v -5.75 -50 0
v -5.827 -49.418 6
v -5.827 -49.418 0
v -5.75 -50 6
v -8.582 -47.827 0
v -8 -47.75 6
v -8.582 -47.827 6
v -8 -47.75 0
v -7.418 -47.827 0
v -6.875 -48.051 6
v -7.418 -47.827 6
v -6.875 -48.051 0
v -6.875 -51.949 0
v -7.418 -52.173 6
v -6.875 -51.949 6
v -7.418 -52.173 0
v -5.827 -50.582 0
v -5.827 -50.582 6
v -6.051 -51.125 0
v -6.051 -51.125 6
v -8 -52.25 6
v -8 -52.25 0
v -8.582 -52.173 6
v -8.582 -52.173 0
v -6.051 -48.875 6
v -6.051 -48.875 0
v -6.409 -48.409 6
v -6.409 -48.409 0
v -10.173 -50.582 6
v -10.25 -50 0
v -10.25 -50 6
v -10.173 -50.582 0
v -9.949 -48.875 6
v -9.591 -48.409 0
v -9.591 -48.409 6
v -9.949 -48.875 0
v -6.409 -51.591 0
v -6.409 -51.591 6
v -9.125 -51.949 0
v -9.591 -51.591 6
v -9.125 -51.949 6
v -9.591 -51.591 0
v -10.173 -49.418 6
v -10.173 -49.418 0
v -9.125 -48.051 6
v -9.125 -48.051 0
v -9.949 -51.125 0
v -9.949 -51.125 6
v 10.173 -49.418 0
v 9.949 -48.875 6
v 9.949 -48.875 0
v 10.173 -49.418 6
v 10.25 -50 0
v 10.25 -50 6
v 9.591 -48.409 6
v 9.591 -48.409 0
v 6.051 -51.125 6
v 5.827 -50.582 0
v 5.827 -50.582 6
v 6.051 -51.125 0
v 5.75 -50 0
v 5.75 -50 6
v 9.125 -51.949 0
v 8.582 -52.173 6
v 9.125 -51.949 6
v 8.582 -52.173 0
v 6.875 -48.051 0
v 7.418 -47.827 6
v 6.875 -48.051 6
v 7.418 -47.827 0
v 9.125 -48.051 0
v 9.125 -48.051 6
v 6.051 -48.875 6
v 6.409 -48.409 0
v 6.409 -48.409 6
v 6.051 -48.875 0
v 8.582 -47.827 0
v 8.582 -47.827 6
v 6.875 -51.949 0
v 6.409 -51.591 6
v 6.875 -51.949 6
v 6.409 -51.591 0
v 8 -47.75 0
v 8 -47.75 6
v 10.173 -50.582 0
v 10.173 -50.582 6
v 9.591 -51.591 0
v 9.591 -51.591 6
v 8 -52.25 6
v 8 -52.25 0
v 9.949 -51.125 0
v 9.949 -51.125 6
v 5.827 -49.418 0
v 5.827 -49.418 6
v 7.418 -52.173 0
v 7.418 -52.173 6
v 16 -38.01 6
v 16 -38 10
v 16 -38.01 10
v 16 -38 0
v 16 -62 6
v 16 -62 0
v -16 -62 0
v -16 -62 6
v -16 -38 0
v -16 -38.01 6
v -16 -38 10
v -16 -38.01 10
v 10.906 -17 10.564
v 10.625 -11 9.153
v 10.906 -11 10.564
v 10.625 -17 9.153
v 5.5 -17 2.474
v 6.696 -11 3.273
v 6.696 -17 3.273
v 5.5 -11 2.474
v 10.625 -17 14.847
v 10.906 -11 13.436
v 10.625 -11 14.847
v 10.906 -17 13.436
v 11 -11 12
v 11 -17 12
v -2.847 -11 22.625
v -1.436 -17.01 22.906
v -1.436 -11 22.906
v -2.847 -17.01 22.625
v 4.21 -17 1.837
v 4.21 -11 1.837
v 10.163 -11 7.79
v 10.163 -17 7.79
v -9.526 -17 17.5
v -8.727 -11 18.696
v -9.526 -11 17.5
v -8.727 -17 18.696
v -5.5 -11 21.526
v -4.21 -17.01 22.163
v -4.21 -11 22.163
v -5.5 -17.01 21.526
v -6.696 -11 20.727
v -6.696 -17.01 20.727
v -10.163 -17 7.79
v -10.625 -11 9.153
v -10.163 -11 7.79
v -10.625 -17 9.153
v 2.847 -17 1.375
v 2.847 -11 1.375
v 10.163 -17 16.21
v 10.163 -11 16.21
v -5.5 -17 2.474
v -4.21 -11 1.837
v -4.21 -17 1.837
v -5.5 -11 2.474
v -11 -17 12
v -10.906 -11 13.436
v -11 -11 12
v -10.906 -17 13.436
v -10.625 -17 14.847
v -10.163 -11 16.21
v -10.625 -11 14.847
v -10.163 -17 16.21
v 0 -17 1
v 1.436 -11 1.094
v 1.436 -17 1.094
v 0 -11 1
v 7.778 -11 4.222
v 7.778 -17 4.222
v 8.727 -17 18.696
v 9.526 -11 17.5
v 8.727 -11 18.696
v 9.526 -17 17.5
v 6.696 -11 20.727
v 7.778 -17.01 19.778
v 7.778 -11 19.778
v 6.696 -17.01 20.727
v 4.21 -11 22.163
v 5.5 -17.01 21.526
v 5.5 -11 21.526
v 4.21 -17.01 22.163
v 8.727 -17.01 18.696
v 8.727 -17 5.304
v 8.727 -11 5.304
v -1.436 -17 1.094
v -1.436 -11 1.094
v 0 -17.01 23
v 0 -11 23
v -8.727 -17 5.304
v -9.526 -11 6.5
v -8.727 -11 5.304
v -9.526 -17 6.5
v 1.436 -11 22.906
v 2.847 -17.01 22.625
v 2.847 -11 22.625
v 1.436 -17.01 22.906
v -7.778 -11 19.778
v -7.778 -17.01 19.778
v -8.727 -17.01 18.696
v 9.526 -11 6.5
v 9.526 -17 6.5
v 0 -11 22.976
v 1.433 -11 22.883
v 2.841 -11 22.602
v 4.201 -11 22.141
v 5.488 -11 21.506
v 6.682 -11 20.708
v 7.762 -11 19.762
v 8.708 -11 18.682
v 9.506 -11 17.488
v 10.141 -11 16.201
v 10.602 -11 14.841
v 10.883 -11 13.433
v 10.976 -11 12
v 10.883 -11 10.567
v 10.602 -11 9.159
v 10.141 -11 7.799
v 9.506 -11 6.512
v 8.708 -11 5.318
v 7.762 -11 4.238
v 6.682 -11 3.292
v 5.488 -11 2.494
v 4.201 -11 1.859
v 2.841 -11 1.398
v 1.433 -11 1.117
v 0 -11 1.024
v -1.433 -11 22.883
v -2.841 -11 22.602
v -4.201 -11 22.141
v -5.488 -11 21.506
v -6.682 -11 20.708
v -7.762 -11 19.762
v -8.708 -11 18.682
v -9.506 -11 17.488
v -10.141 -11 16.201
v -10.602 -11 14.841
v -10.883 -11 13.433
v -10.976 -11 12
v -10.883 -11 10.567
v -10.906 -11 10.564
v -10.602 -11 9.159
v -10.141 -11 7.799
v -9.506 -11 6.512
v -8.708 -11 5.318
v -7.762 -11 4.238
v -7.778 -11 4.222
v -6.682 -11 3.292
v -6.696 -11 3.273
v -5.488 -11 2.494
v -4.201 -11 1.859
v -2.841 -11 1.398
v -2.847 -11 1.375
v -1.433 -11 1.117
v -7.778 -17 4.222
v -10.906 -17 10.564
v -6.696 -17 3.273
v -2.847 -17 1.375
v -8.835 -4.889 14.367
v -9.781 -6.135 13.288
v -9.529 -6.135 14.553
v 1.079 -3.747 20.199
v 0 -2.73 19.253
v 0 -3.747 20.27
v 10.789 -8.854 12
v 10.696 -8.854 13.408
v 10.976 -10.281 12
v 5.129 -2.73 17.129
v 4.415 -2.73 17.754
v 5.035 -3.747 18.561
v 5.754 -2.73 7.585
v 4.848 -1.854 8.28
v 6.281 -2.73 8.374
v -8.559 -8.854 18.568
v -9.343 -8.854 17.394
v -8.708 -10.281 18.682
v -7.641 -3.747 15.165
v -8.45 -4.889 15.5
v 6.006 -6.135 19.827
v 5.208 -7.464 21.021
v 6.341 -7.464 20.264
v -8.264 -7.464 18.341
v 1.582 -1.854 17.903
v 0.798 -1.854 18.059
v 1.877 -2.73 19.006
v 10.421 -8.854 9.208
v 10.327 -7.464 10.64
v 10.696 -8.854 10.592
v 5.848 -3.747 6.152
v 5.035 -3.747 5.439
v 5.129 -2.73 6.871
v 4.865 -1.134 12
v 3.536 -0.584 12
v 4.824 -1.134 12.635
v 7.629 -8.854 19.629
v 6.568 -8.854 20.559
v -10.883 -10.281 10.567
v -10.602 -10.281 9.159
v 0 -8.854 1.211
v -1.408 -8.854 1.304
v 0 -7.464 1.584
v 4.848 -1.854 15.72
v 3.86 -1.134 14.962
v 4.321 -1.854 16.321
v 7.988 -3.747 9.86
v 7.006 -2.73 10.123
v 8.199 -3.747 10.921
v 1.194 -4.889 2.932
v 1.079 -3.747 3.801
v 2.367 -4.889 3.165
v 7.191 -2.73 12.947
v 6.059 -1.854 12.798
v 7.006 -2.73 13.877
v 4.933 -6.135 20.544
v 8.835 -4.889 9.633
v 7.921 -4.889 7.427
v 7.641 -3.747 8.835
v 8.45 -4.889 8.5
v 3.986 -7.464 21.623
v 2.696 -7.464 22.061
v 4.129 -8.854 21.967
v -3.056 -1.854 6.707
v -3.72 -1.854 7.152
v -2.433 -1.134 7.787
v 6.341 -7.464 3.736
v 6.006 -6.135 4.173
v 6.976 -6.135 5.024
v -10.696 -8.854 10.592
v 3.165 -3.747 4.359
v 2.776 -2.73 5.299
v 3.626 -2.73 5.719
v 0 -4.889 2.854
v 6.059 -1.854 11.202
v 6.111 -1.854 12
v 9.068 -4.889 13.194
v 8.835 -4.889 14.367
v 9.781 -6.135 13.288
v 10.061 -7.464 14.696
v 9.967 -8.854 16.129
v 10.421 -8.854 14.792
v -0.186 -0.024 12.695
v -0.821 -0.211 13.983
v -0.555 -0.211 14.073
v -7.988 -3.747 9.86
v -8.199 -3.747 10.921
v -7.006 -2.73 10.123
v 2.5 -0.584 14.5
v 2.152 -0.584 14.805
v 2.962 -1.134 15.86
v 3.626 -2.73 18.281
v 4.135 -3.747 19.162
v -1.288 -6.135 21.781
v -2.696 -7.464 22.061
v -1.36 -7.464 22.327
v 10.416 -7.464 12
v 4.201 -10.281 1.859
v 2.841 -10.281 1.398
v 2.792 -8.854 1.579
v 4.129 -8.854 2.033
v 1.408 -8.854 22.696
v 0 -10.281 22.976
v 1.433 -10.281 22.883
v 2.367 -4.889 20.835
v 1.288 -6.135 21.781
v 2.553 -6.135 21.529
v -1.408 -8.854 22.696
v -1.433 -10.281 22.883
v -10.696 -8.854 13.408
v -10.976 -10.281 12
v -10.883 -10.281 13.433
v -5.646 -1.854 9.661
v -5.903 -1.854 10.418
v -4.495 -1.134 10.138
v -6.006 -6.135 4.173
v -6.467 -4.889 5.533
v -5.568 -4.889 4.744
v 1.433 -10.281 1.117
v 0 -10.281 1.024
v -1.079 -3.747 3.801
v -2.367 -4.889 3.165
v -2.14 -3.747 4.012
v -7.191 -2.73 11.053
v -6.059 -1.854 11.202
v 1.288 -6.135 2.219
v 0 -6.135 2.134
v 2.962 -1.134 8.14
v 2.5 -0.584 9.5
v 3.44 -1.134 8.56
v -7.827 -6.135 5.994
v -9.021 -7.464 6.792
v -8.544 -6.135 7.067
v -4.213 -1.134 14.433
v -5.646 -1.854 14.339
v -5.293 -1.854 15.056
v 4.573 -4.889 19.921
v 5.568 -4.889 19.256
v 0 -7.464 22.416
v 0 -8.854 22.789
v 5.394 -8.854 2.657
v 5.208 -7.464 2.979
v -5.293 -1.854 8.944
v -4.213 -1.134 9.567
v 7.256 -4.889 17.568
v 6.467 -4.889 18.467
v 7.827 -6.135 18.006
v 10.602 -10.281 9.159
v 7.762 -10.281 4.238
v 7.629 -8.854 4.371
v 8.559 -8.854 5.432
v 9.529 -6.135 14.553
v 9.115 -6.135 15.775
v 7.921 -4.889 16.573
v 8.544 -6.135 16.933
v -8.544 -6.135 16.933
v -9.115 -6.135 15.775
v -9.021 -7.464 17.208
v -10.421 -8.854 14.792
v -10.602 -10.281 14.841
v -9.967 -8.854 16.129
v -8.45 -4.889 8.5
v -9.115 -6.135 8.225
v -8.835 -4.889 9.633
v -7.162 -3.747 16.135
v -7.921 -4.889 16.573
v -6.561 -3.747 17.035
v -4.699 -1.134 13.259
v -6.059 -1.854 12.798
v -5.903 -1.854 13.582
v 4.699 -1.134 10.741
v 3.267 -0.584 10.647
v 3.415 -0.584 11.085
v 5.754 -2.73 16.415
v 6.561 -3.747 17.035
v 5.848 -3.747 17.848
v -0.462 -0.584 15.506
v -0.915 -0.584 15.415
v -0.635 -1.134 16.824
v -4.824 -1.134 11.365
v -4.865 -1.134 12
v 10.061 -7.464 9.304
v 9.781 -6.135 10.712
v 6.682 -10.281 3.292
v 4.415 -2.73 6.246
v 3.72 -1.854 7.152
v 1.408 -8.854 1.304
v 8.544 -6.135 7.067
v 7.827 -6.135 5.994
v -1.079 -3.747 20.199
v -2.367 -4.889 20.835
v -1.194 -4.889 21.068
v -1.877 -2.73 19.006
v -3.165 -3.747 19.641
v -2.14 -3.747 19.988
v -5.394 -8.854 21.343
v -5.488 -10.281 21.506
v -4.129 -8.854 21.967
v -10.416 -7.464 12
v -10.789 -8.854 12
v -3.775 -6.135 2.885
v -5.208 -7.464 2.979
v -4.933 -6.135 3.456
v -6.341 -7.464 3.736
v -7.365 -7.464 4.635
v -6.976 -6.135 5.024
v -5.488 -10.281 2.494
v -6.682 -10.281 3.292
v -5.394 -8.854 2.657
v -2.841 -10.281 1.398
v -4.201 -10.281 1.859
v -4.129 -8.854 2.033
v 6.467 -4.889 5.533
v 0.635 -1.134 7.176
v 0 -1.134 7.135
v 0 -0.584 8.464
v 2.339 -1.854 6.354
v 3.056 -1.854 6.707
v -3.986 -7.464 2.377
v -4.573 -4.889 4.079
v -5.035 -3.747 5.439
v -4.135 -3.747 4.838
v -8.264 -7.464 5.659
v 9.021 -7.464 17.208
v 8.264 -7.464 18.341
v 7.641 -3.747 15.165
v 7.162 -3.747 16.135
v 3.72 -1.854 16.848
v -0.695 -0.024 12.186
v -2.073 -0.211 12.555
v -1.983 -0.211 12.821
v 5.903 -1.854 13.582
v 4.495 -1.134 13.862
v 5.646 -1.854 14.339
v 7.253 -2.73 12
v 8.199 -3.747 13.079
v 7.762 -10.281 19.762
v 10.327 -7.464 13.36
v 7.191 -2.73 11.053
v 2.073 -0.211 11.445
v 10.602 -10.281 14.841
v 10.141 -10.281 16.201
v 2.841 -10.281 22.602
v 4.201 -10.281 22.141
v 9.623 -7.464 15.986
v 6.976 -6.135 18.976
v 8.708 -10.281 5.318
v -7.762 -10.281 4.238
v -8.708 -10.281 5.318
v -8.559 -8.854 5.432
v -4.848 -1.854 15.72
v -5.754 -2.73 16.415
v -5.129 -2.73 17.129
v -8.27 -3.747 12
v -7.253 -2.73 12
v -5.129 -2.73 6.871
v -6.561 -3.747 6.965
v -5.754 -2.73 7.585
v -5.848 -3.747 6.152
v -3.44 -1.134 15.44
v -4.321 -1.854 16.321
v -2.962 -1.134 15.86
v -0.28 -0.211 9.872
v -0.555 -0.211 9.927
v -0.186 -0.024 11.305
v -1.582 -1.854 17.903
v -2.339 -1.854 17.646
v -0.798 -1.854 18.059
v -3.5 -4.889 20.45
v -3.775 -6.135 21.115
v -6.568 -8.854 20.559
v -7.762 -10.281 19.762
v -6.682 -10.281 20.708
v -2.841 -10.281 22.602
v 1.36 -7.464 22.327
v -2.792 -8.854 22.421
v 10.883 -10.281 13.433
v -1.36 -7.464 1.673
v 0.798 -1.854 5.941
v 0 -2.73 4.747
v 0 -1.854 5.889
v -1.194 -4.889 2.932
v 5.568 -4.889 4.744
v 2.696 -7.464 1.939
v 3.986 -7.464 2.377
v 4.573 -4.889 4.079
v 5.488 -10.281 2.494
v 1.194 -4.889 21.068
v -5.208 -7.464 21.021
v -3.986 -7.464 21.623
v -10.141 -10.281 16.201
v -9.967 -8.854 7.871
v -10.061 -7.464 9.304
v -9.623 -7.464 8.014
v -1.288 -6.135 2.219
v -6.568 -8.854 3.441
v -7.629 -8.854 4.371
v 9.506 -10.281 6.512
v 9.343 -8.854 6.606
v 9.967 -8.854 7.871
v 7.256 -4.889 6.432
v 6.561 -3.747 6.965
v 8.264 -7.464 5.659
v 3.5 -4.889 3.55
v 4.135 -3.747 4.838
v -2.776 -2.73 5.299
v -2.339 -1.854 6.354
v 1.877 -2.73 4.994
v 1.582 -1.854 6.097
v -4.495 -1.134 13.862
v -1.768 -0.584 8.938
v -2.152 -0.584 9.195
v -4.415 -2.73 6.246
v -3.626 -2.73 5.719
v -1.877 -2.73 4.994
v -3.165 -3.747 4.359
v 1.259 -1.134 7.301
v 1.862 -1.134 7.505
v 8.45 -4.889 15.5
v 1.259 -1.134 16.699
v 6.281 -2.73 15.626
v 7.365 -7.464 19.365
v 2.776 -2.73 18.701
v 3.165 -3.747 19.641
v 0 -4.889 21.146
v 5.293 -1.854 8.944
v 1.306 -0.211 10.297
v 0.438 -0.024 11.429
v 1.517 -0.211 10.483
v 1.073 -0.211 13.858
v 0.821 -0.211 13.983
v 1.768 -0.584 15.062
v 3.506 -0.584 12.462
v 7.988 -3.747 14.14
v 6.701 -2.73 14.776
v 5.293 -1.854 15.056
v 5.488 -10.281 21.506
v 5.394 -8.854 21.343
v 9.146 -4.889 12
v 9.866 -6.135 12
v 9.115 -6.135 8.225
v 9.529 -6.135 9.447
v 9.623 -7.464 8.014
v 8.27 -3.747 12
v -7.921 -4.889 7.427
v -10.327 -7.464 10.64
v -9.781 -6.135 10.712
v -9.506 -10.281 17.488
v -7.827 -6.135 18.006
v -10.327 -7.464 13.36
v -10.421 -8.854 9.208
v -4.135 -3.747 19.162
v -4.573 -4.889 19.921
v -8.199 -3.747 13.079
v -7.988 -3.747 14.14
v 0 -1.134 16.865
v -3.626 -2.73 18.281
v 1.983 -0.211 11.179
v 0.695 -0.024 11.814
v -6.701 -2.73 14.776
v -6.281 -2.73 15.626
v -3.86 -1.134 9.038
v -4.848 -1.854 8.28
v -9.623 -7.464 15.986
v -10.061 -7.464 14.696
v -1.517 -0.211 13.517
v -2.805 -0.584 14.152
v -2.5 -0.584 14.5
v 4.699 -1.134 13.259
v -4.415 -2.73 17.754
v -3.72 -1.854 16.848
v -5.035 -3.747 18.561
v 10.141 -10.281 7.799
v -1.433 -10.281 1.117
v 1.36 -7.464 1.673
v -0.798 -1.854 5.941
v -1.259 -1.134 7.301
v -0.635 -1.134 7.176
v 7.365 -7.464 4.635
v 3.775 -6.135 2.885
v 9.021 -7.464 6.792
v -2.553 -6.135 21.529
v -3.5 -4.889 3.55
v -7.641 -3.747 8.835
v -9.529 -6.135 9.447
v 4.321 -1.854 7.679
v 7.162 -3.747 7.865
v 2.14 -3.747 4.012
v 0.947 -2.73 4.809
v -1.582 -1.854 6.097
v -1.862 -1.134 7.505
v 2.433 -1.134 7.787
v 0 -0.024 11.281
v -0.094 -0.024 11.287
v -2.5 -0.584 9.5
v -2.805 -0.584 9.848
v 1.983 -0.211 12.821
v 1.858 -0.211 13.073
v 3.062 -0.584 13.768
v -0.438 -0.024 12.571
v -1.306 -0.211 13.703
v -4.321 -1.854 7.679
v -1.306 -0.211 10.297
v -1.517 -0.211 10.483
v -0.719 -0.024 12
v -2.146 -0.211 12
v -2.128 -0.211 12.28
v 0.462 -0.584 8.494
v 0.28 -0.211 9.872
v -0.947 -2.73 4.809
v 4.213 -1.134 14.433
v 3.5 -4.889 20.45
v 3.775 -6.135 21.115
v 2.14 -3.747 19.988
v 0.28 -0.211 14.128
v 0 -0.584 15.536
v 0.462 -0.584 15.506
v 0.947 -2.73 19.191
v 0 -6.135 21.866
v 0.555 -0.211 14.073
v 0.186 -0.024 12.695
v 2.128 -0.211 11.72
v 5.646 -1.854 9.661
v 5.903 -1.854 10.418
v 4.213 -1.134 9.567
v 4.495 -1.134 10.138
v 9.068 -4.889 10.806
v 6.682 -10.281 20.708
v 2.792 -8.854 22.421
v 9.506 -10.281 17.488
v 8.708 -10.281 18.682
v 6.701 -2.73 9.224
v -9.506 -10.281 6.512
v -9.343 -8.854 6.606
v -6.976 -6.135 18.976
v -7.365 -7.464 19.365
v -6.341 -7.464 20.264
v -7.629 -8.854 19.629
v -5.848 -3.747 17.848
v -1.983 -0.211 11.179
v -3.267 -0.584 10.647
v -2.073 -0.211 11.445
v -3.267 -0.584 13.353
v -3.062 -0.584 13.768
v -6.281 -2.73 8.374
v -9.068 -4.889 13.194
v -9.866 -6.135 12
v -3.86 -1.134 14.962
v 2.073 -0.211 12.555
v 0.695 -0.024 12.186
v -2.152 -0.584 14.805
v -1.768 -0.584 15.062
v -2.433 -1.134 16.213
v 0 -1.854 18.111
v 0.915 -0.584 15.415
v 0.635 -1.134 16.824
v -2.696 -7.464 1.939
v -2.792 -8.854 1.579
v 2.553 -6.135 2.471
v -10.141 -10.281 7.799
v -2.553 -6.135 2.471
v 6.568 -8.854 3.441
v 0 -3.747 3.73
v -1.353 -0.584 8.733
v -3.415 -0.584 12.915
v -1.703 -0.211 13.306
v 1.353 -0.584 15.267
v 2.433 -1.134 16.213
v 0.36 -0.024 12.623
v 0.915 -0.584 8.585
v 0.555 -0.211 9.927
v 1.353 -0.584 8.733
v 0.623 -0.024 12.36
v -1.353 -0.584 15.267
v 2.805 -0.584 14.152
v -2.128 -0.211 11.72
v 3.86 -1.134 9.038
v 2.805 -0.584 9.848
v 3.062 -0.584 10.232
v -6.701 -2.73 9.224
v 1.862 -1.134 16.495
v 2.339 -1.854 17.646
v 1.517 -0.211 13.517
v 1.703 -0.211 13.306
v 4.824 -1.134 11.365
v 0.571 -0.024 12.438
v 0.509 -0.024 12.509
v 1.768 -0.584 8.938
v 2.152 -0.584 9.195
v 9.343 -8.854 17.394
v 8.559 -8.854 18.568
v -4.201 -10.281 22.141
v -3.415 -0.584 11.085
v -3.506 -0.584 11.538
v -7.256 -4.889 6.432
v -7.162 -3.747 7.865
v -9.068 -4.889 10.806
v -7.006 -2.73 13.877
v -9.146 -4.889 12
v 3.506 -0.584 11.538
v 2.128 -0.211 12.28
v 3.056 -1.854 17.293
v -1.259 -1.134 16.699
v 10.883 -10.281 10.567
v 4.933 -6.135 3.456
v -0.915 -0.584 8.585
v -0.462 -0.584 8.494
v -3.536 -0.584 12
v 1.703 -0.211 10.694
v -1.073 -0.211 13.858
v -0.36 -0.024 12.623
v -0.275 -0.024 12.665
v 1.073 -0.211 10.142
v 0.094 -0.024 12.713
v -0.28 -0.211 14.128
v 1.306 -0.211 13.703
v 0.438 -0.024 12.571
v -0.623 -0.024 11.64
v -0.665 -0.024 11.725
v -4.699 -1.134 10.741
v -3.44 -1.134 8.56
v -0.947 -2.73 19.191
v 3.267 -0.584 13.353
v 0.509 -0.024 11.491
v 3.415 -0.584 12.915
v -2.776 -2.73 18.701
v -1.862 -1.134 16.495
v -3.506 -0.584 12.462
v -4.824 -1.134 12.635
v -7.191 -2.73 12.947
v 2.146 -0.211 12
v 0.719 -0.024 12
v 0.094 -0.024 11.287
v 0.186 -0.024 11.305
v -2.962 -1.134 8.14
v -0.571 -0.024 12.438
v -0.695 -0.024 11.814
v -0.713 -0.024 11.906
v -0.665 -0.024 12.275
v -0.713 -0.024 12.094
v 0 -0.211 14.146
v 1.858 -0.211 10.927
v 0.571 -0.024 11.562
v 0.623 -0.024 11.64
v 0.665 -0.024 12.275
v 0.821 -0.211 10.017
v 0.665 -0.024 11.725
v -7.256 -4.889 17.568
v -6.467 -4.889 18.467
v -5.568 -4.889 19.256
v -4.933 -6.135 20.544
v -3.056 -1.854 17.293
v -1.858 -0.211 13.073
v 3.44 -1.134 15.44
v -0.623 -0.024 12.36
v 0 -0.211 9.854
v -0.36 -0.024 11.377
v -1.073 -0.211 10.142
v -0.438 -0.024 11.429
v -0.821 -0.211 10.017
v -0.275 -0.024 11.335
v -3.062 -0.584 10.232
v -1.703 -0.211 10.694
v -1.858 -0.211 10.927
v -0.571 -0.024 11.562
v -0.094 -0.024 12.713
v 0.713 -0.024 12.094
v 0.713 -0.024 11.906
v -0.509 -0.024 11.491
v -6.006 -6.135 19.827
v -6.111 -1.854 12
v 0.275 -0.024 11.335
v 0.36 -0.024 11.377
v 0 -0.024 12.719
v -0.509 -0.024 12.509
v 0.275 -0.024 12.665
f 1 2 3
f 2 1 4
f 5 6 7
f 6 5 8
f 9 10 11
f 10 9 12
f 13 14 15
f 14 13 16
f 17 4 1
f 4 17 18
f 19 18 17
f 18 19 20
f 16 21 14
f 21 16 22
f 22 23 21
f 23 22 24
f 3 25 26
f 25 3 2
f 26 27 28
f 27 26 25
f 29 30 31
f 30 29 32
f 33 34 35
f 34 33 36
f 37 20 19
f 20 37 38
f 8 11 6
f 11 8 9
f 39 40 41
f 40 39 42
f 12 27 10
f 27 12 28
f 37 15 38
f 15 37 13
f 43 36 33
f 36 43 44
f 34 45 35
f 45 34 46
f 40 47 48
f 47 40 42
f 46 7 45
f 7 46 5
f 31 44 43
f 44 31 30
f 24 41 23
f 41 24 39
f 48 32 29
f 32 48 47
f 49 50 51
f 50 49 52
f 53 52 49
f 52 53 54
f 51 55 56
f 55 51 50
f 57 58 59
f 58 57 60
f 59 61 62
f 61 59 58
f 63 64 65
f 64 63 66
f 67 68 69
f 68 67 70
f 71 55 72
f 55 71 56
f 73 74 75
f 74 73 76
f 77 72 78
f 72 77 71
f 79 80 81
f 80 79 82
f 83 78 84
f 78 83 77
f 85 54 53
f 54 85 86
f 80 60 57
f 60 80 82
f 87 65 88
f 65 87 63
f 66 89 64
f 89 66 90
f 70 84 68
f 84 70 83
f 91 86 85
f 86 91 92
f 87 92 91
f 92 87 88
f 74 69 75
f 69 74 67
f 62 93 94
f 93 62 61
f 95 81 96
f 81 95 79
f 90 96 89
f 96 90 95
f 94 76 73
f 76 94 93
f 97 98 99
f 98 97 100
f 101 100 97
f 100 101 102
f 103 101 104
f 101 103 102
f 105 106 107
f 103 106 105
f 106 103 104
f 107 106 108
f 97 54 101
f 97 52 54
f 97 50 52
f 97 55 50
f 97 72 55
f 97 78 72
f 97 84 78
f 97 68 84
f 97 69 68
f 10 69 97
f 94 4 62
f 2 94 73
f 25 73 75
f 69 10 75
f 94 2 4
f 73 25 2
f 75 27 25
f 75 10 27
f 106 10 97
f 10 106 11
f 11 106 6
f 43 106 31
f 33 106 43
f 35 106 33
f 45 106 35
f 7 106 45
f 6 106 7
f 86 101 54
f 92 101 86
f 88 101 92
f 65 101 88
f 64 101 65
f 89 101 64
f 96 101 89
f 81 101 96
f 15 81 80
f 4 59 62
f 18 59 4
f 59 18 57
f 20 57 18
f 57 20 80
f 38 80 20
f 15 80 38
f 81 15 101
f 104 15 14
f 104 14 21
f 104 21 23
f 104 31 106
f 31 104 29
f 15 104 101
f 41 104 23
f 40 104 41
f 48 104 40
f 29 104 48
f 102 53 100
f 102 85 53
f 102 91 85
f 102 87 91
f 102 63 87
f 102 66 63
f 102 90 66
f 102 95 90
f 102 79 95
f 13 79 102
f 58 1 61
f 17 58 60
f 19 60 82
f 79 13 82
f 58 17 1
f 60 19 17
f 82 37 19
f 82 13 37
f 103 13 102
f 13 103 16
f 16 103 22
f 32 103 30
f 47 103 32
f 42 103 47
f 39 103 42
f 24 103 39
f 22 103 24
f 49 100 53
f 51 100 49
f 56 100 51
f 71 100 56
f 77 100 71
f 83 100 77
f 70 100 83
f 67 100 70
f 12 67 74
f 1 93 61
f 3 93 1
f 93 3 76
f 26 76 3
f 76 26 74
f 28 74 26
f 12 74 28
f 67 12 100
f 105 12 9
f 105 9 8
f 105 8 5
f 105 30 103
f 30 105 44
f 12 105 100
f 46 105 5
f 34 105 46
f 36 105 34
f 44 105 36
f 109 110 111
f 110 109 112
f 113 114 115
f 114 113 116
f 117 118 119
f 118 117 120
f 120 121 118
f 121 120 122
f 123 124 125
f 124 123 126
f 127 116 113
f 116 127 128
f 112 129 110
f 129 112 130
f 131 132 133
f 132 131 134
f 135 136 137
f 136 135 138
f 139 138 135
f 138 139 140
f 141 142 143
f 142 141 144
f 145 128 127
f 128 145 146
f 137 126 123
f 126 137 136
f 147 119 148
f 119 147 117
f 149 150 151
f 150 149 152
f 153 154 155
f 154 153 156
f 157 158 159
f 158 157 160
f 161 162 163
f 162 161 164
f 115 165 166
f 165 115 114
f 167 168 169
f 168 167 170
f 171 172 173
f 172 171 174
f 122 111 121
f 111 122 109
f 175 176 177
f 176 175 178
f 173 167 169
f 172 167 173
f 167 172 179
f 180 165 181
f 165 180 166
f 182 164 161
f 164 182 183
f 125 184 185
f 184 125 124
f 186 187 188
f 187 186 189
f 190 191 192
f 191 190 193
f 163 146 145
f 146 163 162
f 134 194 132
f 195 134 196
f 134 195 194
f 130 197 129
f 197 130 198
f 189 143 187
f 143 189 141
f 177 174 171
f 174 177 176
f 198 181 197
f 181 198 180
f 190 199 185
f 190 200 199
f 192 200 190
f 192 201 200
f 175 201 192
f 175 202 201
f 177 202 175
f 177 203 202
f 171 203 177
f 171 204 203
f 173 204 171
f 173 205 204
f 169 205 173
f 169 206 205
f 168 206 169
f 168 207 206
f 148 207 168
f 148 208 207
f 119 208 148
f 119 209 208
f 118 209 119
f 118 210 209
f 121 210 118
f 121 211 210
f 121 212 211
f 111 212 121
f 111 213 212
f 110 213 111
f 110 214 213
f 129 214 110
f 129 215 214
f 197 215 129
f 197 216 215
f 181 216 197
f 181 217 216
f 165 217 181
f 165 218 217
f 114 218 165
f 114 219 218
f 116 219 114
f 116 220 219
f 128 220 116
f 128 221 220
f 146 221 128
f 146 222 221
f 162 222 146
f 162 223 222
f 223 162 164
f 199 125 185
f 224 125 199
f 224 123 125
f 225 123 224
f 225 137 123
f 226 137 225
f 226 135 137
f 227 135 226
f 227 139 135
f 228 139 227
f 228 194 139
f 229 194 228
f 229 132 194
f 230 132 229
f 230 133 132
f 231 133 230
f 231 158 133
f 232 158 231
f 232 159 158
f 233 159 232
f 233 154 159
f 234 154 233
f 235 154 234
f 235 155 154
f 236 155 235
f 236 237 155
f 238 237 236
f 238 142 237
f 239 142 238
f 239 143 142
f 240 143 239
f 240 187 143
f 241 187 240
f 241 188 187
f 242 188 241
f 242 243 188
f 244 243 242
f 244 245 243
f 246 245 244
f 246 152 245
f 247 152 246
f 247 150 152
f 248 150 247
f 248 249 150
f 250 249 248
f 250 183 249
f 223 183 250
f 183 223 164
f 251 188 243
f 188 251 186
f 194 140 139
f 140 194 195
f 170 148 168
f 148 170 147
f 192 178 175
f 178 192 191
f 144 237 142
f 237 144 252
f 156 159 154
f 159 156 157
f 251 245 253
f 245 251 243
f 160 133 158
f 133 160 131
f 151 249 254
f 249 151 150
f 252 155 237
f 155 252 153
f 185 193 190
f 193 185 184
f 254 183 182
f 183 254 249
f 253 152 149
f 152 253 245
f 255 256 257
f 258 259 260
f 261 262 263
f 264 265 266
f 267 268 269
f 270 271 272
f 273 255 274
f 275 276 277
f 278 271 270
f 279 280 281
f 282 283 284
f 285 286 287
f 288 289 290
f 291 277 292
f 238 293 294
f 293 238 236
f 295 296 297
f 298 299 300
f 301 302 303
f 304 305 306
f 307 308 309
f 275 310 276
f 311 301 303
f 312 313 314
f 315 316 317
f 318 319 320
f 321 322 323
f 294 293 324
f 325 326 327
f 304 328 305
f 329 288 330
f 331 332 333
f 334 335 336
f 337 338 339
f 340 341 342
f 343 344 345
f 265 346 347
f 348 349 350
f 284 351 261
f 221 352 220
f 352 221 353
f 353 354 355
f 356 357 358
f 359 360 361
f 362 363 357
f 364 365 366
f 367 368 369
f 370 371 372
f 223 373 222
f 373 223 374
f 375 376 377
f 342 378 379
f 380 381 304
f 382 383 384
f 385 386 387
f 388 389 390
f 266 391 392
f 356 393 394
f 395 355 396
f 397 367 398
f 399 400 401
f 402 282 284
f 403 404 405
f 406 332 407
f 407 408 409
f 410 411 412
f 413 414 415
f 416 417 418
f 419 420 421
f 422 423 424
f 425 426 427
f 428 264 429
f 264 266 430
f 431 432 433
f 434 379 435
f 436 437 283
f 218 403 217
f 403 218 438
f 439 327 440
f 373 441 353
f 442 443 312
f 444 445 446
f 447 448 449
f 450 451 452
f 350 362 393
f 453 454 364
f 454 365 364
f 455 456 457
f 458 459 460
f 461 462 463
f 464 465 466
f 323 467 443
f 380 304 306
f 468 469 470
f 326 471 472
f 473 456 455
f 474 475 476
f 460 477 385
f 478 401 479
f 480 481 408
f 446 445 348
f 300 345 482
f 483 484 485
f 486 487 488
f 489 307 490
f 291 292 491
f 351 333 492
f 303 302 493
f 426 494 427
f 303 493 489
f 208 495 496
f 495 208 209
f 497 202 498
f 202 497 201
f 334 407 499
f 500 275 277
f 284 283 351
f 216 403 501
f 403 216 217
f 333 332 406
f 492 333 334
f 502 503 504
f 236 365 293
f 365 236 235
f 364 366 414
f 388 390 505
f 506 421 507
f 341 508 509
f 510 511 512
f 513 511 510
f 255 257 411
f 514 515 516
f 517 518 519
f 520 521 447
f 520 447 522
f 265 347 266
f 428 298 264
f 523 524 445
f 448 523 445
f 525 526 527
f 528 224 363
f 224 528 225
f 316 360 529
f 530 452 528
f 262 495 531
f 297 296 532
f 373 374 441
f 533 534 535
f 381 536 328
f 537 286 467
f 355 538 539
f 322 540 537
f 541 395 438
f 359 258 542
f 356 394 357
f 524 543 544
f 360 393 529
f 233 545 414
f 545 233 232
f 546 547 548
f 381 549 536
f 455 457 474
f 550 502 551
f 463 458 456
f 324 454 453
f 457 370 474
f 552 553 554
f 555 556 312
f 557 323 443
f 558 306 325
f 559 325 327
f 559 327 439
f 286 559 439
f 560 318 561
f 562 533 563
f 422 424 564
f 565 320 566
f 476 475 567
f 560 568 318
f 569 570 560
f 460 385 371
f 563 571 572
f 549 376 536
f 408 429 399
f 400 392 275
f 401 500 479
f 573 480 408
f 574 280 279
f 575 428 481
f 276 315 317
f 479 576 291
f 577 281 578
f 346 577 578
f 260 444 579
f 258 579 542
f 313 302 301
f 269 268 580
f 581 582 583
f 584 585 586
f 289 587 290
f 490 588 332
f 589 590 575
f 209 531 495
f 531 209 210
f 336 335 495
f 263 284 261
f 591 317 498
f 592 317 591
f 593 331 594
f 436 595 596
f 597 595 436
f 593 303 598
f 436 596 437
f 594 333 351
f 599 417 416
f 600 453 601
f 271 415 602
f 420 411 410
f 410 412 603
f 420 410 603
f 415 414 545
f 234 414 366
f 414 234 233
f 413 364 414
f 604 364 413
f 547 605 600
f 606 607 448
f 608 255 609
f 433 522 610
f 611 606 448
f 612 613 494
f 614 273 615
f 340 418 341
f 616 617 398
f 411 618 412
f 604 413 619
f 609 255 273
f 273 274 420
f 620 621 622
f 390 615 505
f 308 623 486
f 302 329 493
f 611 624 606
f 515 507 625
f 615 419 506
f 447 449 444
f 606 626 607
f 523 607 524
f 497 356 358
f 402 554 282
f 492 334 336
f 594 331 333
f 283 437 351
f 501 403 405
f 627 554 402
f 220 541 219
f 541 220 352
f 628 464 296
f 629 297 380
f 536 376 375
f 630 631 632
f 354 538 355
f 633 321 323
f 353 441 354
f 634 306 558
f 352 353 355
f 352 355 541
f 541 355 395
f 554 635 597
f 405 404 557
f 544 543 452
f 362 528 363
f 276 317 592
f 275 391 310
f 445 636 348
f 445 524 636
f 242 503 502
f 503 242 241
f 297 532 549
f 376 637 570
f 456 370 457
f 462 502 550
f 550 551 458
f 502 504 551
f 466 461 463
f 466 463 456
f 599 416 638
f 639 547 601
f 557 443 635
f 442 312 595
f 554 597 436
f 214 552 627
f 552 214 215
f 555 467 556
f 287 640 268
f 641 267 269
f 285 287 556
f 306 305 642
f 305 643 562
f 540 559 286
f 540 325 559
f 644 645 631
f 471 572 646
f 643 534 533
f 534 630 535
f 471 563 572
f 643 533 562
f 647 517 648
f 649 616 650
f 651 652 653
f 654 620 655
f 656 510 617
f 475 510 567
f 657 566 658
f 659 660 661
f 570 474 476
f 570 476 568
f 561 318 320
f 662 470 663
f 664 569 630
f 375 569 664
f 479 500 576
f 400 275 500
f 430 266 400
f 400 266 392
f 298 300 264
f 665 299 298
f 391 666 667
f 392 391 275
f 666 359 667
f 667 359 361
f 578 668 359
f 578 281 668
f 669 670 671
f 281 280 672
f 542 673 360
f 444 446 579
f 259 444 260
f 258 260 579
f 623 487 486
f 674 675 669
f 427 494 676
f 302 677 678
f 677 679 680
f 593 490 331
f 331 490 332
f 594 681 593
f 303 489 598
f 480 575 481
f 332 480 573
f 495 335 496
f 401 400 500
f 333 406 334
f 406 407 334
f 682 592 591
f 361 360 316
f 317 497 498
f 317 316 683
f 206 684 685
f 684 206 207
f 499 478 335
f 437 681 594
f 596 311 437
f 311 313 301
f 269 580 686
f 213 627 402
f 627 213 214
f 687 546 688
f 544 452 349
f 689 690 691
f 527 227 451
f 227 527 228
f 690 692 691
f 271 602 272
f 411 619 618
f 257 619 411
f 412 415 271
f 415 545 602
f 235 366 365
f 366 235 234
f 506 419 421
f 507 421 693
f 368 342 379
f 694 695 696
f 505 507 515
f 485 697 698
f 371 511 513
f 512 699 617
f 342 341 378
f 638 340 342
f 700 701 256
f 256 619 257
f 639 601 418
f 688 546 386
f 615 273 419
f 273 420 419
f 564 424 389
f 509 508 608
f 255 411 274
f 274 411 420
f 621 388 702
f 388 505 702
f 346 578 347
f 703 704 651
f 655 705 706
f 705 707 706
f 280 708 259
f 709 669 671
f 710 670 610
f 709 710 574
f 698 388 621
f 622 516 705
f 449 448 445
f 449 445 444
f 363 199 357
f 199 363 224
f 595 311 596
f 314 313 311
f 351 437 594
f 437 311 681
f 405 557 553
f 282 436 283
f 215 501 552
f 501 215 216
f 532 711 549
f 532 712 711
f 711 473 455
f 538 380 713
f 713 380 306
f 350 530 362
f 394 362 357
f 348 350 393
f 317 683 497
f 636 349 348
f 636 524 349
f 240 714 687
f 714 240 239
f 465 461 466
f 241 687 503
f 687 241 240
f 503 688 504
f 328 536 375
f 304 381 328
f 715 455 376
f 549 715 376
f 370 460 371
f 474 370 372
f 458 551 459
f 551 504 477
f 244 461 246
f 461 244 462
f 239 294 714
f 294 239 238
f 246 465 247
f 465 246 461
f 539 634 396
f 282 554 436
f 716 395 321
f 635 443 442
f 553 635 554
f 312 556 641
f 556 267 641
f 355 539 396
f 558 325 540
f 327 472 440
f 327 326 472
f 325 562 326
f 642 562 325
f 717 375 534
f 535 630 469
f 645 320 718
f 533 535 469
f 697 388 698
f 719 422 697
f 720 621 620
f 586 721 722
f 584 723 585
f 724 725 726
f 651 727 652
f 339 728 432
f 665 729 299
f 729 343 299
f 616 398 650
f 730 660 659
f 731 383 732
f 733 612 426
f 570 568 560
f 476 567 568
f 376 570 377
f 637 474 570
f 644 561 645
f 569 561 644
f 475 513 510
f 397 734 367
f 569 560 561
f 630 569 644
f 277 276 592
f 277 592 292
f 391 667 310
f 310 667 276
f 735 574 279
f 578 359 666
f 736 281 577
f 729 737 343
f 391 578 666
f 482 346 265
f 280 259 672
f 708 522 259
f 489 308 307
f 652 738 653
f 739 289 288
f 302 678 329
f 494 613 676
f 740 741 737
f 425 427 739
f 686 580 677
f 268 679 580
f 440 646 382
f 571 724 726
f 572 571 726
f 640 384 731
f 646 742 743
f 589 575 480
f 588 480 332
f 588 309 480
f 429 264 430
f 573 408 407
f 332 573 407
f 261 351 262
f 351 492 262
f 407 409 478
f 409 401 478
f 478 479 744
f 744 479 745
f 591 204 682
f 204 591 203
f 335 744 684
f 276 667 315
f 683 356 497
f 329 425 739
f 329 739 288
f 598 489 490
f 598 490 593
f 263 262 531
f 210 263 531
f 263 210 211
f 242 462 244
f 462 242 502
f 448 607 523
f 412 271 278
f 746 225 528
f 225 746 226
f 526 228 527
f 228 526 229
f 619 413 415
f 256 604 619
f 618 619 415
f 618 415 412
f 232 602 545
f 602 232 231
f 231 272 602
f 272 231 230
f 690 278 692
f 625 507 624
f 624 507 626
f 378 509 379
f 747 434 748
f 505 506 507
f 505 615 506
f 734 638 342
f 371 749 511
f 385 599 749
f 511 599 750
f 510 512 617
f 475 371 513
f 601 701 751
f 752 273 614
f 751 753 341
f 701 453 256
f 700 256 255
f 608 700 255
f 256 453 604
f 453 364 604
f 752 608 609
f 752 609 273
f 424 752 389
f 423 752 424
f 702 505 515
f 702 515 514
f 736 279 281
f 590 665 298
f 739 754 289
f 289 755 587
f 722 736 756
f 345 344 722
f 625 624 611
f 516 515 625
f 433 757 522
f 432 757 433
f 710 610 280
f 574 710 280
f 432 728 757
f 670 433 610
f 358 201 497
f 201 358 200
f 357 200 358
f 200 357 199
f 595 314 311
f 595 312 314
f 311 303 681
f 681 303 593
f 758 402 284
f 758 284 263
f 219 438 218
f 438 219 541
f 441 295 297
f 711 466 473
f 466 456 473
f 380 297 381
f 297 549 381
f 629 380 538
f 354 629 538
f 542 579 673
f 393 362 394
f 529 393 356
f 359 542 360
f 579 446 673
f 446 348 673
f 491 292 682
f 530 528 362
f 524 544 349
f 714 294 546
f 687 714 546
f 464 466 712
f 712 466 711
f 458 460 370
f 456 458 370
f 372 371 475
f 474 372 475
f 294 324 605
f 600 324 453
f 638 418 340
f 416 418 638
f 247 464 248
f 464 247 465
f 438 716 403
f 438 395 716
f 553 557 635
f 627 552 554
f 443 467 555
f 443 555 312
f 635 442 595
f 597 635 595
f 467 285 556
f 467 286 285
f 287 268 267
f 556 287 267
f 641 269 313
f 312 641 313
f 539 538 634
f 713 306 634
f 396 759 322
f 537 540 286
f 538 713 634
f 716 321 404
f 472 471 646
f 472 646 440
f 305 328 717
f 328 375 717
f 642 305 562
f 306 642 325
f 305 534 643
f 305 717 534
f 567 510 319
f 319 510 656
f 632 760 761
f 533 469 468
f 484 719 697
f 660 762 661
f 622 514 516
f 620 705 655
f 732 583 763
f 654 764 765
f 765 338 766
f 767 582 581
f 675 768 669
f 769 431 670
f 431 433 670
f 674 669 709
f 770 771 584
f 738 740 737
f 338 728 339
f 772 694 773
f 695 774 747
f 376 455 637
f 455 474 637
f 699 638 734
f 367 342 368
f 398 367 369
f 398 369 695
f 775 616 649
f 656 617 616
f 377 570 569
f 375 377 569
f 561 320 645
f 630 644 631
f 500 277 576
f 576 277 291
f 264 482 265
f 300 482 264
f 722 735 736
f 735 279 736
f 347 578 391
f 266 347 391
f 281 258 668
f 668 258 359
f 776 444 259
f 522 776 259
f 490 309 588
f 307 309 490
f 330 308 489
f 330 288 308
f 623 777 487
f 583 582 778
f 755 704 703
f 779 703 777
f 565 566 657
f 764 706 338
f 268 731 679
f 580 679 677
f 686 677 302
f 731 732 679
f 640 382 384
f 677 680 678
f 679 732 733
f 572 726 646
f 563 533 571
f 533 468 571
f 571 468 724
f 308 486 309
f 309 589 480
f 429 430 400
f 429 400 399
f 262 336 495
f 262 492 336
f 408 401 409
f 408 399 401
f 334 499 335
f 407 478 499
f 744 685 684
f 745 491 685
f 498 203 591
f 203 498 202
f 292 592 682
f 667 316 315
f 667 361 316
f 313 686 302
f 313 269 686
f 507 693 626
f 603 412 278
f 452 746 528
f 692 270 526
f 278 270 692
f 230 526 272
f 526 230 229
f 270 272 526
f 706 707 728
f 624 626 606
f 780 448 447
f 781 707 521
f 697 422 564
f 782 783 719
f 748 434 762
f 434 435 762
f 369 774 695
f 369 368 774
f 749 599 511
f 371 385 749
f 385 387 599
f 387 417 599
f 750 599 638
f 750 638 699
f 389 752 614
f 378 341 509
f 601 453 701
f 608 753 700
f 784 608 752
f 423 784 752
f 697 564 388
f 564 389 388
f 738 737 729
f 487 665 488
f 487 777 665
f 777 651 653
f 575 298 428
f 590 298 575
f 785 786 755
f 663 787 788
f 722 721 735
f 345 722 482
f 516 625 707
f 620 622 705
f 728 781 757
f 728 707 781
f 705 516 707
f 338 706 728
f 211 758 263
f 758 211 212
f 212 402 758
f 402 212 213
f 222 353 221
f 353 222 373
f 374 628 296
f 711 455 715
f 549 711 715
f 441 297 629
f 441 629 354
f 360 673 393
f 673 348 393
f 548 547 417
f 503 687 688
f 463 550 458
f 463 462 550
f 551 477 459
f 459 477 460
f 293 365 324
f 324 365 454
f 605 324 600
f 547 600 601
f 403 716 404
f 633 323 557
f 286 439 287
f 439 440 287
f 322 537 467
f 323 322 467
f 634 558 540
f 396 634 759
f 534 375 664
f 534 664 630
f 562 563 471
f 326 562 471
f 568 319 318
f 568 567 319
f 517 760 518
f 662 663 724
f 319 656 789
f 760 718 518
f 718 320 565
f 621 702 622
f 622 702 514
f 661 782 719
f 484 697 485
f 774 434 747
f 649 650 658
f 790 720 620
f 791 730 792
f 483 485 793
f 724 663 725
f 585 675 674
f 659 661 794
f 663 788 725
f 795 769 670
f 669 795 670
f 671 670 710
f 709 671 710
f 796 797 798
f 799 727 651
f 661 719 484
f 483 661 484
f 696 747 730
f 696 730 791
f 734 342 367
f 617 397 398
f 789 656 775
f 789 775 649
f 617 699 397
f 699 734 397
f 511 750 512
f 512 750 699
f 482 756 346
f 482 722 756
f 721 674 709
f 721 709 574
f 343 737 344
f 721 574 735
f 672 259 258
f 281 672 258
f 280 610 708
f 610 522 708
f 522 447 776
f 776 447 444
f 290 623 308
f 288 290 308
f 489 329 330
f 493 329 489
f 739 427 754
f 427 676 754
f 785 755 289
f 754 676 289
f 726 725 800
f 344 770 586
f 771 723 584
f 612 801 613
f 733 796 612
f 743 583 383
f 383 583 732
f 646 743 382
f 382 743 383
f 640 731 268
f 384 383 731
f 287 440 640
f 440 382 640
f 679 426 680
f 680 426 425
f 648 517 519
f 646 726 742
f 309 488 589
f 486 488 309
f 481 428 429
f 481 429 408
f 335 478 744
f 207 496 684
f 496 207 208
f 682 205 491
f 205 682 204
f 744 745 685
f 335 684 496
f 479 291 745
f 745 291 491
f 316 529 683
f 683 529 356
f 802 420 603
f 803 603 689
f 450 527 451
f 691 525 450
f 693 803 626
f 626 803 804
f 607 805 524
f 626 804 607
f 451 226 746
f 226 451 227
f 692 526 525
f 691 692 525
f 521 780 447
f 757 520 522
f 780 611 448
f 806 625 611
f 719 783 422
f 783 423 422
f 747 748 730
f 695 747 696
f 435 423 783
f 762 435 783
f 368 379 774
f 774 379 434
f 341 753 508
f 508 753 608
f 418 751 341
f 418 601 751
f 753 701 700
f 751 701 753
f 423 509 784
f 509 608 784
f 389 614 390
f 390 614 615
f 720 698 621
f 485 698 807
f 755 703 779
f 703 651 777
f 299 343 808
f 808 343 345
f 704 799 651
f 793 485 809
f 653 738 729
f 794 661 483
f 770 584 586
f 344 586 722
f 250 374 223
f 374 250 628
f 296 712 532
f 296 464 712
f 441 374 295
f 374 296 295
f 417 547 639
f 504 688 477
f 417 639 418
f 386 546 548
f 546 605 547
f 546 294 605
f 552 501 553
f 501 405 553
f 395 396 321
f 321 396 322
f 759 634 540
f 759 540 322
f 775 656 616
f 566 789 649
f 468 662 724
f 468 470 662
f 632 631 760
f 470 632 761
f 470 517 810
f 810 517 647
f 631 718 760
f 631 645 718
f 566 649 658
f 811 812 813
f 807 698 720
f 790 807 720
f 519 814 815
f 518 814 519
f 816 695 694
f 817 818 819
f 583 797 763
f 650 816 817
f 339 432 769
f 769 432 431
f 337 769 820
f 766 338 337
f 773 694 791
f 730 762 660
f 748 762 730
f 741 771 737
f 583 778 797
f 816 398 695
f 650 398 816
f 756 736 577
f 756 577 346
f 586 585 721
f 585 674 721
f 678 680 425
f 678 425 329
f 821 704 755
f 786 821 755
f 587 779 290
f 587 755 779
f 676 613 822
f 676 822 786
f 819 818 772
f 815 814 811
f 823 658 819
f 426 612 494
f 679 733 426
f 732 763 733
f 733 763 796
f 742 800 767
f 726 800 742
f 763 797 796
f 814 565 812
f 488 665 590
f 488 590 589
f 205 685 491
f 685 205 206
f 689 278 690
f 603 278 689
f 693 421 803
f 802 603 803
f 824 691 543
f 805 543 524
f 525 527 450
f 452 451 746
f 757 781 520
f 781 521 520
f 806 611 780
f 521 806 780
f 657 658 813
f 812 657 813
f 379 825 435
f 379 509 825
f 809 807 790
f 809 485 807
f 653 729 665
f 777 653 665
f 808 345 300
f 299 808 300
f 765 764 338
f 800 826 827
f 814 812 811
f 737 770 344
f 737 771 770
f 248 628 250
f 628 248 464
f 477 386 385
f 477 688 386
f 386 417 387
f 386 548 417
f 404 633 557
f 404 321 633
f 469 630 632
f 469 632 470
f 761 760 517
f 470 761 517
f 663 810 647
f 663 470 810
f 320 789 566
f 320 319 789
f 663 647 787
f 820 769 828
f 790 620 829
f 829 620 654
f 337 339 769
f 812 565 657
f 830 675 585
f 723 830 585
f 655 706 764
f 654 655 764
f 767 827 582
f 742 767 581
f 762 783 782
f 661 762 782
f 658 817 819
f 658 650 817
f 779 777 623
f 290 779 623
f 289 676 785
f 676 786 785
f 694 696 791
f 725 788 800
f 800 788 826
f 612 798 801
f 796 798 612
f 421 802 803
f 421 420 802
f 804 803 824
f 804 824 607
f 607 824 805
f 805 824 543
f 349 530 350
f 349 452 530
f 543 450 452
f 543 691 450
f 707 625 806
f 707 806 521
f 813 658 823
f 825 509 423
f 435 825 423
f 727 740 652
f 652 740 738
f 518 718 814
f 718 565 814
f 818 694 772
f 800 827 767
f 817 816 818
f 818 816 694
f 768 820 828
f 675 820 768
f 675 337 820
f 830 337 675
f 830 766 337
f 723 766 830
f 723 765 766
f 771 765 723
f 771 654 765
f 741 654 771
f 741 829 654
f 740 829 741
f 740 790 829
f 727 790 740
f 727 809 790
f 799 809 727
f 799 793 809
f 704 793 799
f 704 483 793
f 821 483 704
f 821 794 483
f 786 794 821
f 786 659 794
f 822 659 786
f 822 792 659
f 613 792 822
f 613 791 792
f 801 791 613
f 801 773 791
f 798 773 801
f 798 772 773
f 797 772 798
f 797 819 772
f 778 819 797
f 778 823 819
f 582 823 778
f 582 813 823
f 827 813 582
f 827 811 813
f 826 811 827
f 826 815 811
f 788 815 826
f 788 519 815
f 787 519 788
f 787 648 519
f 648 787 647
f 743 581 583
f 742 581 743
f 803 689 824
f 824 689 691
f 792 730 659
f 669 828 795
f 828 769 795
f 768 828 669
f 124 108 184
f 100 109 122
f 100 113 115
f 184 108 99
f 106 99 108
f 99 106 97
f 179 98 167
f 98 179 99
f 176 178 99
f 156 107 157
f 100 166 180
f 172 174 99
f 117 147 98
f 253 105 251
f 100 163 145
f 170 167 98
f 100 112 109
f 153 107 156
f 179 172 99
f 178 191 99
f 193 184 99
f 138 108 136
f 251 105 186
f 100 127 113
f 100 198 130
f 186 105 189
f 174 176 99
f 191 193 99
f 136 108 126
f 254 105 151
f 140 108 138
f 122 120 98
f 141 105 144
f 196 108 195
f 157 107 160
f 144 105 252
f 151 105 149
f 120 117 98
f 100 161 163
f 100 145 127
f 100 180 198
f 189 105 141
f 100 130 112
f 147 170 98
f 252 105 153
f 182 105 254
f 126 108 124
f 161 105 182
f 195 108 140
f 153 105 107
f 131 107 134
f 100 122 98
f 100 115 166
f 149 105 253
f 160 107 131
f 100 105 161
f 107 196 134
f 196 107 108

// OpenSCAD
// Rear leg + skid for Grover, replacing the Makeblock L-bracket that
// sheared at its bend in the 2026-10-18 fall (and the separate printed
// skid that hung from it). One PETG piece: a vertical plate that bolts to
// the two M4 socket-cap bolts left on the rear beam stub, a web down to a
// foot, and the domed skid grown out of the foot's underside. No bent
// joint, no second part to lose.
//
// Load case: the skid takes a sideways drag on every stop and pivot, so
// the web is a full-width wedge (thick at the plate, tapering to the
// foot), not a thin arm.
//
// Print: lying on its BACK (the plate face on the bed), dome pointing up
// and sideways -> no supports with the 45 deg wedge. Modelled upright for
// readability; rotate in the slicer or use the print module below.
//
// ASSUMED until Enoch measures (2026-10-18): bolt_cc, bolt_h, plate_w.

// ---- Interface to the beam stub (Makeblock 8 mm grid, M4) ---------------
bolt_cc   = 16;    // the two socket caps, centre to centre        (ASSUMED)
bolt_h    = 50;    // their centreline above the bench, rover level (ASSUMED)
m4_hole   = 4.5;
plate_w   = 32;    // plate width across the bolts (bolt_cc + 2*8)
plate_h   = 24;    // plate height, bolts on its mid-line
plate_t   = 6;

// ---- Leg and skid -----------------------------------------------------
foot_d    = 22;    // same dome as caster-skid.scad
dome_r    = 11;
foot_t    = 6;     // flat part of the foot above the dome
setback   = 12;    // skid centre behind the plate face (rearward)
web_t     = 10;    // web thickness at the plate, tapers to the foot

leg_h = bolt_h - plate_h / 2;             // plate bottom edge to bench
ground_to_foot = leg_h - dome_r - foot_t;  // height of the web

module leg() {
  // plate, bolts on the mid-line, z=0 at the bench, y+ = rearward
  difference() {
    translate([-plate_w / 2, 0, bolt_h - plate_h / 2]) cube([plate_w, plate_t, plate_h]);
    for (x = [-bolt_cc / 2, bolt_cc / 2])
      translate([x, -1, bolt_h]) rotate([-90, 0, 0]) cylinder(d = m4_hole, h = plate_t + 2, $fn = 24);
  }
  // wedge web: full plate width at the top, foot width at the bottom
  hull() {
    translate([-plate_w / 2, 0, bolt_h - plate_h / 2]) cube([plate_w, web_t, 0.01]);
    translate([0, setback, dome_r + foot_t]) cylinder(d = foot_d, h = 0.01, $fn = 48);
  }
  // foot + dome
  translate([0, setback, dome_r]) {
    cylinder(d = foot_d, h = foot_t, $fn = 48);
    sphere(r = dome_r, $fn = 48);
  }
}

// print orientation: plate face down on the bed
module print_leg() { rotate([90, 0, 0]) leg(); }

print_leg();
